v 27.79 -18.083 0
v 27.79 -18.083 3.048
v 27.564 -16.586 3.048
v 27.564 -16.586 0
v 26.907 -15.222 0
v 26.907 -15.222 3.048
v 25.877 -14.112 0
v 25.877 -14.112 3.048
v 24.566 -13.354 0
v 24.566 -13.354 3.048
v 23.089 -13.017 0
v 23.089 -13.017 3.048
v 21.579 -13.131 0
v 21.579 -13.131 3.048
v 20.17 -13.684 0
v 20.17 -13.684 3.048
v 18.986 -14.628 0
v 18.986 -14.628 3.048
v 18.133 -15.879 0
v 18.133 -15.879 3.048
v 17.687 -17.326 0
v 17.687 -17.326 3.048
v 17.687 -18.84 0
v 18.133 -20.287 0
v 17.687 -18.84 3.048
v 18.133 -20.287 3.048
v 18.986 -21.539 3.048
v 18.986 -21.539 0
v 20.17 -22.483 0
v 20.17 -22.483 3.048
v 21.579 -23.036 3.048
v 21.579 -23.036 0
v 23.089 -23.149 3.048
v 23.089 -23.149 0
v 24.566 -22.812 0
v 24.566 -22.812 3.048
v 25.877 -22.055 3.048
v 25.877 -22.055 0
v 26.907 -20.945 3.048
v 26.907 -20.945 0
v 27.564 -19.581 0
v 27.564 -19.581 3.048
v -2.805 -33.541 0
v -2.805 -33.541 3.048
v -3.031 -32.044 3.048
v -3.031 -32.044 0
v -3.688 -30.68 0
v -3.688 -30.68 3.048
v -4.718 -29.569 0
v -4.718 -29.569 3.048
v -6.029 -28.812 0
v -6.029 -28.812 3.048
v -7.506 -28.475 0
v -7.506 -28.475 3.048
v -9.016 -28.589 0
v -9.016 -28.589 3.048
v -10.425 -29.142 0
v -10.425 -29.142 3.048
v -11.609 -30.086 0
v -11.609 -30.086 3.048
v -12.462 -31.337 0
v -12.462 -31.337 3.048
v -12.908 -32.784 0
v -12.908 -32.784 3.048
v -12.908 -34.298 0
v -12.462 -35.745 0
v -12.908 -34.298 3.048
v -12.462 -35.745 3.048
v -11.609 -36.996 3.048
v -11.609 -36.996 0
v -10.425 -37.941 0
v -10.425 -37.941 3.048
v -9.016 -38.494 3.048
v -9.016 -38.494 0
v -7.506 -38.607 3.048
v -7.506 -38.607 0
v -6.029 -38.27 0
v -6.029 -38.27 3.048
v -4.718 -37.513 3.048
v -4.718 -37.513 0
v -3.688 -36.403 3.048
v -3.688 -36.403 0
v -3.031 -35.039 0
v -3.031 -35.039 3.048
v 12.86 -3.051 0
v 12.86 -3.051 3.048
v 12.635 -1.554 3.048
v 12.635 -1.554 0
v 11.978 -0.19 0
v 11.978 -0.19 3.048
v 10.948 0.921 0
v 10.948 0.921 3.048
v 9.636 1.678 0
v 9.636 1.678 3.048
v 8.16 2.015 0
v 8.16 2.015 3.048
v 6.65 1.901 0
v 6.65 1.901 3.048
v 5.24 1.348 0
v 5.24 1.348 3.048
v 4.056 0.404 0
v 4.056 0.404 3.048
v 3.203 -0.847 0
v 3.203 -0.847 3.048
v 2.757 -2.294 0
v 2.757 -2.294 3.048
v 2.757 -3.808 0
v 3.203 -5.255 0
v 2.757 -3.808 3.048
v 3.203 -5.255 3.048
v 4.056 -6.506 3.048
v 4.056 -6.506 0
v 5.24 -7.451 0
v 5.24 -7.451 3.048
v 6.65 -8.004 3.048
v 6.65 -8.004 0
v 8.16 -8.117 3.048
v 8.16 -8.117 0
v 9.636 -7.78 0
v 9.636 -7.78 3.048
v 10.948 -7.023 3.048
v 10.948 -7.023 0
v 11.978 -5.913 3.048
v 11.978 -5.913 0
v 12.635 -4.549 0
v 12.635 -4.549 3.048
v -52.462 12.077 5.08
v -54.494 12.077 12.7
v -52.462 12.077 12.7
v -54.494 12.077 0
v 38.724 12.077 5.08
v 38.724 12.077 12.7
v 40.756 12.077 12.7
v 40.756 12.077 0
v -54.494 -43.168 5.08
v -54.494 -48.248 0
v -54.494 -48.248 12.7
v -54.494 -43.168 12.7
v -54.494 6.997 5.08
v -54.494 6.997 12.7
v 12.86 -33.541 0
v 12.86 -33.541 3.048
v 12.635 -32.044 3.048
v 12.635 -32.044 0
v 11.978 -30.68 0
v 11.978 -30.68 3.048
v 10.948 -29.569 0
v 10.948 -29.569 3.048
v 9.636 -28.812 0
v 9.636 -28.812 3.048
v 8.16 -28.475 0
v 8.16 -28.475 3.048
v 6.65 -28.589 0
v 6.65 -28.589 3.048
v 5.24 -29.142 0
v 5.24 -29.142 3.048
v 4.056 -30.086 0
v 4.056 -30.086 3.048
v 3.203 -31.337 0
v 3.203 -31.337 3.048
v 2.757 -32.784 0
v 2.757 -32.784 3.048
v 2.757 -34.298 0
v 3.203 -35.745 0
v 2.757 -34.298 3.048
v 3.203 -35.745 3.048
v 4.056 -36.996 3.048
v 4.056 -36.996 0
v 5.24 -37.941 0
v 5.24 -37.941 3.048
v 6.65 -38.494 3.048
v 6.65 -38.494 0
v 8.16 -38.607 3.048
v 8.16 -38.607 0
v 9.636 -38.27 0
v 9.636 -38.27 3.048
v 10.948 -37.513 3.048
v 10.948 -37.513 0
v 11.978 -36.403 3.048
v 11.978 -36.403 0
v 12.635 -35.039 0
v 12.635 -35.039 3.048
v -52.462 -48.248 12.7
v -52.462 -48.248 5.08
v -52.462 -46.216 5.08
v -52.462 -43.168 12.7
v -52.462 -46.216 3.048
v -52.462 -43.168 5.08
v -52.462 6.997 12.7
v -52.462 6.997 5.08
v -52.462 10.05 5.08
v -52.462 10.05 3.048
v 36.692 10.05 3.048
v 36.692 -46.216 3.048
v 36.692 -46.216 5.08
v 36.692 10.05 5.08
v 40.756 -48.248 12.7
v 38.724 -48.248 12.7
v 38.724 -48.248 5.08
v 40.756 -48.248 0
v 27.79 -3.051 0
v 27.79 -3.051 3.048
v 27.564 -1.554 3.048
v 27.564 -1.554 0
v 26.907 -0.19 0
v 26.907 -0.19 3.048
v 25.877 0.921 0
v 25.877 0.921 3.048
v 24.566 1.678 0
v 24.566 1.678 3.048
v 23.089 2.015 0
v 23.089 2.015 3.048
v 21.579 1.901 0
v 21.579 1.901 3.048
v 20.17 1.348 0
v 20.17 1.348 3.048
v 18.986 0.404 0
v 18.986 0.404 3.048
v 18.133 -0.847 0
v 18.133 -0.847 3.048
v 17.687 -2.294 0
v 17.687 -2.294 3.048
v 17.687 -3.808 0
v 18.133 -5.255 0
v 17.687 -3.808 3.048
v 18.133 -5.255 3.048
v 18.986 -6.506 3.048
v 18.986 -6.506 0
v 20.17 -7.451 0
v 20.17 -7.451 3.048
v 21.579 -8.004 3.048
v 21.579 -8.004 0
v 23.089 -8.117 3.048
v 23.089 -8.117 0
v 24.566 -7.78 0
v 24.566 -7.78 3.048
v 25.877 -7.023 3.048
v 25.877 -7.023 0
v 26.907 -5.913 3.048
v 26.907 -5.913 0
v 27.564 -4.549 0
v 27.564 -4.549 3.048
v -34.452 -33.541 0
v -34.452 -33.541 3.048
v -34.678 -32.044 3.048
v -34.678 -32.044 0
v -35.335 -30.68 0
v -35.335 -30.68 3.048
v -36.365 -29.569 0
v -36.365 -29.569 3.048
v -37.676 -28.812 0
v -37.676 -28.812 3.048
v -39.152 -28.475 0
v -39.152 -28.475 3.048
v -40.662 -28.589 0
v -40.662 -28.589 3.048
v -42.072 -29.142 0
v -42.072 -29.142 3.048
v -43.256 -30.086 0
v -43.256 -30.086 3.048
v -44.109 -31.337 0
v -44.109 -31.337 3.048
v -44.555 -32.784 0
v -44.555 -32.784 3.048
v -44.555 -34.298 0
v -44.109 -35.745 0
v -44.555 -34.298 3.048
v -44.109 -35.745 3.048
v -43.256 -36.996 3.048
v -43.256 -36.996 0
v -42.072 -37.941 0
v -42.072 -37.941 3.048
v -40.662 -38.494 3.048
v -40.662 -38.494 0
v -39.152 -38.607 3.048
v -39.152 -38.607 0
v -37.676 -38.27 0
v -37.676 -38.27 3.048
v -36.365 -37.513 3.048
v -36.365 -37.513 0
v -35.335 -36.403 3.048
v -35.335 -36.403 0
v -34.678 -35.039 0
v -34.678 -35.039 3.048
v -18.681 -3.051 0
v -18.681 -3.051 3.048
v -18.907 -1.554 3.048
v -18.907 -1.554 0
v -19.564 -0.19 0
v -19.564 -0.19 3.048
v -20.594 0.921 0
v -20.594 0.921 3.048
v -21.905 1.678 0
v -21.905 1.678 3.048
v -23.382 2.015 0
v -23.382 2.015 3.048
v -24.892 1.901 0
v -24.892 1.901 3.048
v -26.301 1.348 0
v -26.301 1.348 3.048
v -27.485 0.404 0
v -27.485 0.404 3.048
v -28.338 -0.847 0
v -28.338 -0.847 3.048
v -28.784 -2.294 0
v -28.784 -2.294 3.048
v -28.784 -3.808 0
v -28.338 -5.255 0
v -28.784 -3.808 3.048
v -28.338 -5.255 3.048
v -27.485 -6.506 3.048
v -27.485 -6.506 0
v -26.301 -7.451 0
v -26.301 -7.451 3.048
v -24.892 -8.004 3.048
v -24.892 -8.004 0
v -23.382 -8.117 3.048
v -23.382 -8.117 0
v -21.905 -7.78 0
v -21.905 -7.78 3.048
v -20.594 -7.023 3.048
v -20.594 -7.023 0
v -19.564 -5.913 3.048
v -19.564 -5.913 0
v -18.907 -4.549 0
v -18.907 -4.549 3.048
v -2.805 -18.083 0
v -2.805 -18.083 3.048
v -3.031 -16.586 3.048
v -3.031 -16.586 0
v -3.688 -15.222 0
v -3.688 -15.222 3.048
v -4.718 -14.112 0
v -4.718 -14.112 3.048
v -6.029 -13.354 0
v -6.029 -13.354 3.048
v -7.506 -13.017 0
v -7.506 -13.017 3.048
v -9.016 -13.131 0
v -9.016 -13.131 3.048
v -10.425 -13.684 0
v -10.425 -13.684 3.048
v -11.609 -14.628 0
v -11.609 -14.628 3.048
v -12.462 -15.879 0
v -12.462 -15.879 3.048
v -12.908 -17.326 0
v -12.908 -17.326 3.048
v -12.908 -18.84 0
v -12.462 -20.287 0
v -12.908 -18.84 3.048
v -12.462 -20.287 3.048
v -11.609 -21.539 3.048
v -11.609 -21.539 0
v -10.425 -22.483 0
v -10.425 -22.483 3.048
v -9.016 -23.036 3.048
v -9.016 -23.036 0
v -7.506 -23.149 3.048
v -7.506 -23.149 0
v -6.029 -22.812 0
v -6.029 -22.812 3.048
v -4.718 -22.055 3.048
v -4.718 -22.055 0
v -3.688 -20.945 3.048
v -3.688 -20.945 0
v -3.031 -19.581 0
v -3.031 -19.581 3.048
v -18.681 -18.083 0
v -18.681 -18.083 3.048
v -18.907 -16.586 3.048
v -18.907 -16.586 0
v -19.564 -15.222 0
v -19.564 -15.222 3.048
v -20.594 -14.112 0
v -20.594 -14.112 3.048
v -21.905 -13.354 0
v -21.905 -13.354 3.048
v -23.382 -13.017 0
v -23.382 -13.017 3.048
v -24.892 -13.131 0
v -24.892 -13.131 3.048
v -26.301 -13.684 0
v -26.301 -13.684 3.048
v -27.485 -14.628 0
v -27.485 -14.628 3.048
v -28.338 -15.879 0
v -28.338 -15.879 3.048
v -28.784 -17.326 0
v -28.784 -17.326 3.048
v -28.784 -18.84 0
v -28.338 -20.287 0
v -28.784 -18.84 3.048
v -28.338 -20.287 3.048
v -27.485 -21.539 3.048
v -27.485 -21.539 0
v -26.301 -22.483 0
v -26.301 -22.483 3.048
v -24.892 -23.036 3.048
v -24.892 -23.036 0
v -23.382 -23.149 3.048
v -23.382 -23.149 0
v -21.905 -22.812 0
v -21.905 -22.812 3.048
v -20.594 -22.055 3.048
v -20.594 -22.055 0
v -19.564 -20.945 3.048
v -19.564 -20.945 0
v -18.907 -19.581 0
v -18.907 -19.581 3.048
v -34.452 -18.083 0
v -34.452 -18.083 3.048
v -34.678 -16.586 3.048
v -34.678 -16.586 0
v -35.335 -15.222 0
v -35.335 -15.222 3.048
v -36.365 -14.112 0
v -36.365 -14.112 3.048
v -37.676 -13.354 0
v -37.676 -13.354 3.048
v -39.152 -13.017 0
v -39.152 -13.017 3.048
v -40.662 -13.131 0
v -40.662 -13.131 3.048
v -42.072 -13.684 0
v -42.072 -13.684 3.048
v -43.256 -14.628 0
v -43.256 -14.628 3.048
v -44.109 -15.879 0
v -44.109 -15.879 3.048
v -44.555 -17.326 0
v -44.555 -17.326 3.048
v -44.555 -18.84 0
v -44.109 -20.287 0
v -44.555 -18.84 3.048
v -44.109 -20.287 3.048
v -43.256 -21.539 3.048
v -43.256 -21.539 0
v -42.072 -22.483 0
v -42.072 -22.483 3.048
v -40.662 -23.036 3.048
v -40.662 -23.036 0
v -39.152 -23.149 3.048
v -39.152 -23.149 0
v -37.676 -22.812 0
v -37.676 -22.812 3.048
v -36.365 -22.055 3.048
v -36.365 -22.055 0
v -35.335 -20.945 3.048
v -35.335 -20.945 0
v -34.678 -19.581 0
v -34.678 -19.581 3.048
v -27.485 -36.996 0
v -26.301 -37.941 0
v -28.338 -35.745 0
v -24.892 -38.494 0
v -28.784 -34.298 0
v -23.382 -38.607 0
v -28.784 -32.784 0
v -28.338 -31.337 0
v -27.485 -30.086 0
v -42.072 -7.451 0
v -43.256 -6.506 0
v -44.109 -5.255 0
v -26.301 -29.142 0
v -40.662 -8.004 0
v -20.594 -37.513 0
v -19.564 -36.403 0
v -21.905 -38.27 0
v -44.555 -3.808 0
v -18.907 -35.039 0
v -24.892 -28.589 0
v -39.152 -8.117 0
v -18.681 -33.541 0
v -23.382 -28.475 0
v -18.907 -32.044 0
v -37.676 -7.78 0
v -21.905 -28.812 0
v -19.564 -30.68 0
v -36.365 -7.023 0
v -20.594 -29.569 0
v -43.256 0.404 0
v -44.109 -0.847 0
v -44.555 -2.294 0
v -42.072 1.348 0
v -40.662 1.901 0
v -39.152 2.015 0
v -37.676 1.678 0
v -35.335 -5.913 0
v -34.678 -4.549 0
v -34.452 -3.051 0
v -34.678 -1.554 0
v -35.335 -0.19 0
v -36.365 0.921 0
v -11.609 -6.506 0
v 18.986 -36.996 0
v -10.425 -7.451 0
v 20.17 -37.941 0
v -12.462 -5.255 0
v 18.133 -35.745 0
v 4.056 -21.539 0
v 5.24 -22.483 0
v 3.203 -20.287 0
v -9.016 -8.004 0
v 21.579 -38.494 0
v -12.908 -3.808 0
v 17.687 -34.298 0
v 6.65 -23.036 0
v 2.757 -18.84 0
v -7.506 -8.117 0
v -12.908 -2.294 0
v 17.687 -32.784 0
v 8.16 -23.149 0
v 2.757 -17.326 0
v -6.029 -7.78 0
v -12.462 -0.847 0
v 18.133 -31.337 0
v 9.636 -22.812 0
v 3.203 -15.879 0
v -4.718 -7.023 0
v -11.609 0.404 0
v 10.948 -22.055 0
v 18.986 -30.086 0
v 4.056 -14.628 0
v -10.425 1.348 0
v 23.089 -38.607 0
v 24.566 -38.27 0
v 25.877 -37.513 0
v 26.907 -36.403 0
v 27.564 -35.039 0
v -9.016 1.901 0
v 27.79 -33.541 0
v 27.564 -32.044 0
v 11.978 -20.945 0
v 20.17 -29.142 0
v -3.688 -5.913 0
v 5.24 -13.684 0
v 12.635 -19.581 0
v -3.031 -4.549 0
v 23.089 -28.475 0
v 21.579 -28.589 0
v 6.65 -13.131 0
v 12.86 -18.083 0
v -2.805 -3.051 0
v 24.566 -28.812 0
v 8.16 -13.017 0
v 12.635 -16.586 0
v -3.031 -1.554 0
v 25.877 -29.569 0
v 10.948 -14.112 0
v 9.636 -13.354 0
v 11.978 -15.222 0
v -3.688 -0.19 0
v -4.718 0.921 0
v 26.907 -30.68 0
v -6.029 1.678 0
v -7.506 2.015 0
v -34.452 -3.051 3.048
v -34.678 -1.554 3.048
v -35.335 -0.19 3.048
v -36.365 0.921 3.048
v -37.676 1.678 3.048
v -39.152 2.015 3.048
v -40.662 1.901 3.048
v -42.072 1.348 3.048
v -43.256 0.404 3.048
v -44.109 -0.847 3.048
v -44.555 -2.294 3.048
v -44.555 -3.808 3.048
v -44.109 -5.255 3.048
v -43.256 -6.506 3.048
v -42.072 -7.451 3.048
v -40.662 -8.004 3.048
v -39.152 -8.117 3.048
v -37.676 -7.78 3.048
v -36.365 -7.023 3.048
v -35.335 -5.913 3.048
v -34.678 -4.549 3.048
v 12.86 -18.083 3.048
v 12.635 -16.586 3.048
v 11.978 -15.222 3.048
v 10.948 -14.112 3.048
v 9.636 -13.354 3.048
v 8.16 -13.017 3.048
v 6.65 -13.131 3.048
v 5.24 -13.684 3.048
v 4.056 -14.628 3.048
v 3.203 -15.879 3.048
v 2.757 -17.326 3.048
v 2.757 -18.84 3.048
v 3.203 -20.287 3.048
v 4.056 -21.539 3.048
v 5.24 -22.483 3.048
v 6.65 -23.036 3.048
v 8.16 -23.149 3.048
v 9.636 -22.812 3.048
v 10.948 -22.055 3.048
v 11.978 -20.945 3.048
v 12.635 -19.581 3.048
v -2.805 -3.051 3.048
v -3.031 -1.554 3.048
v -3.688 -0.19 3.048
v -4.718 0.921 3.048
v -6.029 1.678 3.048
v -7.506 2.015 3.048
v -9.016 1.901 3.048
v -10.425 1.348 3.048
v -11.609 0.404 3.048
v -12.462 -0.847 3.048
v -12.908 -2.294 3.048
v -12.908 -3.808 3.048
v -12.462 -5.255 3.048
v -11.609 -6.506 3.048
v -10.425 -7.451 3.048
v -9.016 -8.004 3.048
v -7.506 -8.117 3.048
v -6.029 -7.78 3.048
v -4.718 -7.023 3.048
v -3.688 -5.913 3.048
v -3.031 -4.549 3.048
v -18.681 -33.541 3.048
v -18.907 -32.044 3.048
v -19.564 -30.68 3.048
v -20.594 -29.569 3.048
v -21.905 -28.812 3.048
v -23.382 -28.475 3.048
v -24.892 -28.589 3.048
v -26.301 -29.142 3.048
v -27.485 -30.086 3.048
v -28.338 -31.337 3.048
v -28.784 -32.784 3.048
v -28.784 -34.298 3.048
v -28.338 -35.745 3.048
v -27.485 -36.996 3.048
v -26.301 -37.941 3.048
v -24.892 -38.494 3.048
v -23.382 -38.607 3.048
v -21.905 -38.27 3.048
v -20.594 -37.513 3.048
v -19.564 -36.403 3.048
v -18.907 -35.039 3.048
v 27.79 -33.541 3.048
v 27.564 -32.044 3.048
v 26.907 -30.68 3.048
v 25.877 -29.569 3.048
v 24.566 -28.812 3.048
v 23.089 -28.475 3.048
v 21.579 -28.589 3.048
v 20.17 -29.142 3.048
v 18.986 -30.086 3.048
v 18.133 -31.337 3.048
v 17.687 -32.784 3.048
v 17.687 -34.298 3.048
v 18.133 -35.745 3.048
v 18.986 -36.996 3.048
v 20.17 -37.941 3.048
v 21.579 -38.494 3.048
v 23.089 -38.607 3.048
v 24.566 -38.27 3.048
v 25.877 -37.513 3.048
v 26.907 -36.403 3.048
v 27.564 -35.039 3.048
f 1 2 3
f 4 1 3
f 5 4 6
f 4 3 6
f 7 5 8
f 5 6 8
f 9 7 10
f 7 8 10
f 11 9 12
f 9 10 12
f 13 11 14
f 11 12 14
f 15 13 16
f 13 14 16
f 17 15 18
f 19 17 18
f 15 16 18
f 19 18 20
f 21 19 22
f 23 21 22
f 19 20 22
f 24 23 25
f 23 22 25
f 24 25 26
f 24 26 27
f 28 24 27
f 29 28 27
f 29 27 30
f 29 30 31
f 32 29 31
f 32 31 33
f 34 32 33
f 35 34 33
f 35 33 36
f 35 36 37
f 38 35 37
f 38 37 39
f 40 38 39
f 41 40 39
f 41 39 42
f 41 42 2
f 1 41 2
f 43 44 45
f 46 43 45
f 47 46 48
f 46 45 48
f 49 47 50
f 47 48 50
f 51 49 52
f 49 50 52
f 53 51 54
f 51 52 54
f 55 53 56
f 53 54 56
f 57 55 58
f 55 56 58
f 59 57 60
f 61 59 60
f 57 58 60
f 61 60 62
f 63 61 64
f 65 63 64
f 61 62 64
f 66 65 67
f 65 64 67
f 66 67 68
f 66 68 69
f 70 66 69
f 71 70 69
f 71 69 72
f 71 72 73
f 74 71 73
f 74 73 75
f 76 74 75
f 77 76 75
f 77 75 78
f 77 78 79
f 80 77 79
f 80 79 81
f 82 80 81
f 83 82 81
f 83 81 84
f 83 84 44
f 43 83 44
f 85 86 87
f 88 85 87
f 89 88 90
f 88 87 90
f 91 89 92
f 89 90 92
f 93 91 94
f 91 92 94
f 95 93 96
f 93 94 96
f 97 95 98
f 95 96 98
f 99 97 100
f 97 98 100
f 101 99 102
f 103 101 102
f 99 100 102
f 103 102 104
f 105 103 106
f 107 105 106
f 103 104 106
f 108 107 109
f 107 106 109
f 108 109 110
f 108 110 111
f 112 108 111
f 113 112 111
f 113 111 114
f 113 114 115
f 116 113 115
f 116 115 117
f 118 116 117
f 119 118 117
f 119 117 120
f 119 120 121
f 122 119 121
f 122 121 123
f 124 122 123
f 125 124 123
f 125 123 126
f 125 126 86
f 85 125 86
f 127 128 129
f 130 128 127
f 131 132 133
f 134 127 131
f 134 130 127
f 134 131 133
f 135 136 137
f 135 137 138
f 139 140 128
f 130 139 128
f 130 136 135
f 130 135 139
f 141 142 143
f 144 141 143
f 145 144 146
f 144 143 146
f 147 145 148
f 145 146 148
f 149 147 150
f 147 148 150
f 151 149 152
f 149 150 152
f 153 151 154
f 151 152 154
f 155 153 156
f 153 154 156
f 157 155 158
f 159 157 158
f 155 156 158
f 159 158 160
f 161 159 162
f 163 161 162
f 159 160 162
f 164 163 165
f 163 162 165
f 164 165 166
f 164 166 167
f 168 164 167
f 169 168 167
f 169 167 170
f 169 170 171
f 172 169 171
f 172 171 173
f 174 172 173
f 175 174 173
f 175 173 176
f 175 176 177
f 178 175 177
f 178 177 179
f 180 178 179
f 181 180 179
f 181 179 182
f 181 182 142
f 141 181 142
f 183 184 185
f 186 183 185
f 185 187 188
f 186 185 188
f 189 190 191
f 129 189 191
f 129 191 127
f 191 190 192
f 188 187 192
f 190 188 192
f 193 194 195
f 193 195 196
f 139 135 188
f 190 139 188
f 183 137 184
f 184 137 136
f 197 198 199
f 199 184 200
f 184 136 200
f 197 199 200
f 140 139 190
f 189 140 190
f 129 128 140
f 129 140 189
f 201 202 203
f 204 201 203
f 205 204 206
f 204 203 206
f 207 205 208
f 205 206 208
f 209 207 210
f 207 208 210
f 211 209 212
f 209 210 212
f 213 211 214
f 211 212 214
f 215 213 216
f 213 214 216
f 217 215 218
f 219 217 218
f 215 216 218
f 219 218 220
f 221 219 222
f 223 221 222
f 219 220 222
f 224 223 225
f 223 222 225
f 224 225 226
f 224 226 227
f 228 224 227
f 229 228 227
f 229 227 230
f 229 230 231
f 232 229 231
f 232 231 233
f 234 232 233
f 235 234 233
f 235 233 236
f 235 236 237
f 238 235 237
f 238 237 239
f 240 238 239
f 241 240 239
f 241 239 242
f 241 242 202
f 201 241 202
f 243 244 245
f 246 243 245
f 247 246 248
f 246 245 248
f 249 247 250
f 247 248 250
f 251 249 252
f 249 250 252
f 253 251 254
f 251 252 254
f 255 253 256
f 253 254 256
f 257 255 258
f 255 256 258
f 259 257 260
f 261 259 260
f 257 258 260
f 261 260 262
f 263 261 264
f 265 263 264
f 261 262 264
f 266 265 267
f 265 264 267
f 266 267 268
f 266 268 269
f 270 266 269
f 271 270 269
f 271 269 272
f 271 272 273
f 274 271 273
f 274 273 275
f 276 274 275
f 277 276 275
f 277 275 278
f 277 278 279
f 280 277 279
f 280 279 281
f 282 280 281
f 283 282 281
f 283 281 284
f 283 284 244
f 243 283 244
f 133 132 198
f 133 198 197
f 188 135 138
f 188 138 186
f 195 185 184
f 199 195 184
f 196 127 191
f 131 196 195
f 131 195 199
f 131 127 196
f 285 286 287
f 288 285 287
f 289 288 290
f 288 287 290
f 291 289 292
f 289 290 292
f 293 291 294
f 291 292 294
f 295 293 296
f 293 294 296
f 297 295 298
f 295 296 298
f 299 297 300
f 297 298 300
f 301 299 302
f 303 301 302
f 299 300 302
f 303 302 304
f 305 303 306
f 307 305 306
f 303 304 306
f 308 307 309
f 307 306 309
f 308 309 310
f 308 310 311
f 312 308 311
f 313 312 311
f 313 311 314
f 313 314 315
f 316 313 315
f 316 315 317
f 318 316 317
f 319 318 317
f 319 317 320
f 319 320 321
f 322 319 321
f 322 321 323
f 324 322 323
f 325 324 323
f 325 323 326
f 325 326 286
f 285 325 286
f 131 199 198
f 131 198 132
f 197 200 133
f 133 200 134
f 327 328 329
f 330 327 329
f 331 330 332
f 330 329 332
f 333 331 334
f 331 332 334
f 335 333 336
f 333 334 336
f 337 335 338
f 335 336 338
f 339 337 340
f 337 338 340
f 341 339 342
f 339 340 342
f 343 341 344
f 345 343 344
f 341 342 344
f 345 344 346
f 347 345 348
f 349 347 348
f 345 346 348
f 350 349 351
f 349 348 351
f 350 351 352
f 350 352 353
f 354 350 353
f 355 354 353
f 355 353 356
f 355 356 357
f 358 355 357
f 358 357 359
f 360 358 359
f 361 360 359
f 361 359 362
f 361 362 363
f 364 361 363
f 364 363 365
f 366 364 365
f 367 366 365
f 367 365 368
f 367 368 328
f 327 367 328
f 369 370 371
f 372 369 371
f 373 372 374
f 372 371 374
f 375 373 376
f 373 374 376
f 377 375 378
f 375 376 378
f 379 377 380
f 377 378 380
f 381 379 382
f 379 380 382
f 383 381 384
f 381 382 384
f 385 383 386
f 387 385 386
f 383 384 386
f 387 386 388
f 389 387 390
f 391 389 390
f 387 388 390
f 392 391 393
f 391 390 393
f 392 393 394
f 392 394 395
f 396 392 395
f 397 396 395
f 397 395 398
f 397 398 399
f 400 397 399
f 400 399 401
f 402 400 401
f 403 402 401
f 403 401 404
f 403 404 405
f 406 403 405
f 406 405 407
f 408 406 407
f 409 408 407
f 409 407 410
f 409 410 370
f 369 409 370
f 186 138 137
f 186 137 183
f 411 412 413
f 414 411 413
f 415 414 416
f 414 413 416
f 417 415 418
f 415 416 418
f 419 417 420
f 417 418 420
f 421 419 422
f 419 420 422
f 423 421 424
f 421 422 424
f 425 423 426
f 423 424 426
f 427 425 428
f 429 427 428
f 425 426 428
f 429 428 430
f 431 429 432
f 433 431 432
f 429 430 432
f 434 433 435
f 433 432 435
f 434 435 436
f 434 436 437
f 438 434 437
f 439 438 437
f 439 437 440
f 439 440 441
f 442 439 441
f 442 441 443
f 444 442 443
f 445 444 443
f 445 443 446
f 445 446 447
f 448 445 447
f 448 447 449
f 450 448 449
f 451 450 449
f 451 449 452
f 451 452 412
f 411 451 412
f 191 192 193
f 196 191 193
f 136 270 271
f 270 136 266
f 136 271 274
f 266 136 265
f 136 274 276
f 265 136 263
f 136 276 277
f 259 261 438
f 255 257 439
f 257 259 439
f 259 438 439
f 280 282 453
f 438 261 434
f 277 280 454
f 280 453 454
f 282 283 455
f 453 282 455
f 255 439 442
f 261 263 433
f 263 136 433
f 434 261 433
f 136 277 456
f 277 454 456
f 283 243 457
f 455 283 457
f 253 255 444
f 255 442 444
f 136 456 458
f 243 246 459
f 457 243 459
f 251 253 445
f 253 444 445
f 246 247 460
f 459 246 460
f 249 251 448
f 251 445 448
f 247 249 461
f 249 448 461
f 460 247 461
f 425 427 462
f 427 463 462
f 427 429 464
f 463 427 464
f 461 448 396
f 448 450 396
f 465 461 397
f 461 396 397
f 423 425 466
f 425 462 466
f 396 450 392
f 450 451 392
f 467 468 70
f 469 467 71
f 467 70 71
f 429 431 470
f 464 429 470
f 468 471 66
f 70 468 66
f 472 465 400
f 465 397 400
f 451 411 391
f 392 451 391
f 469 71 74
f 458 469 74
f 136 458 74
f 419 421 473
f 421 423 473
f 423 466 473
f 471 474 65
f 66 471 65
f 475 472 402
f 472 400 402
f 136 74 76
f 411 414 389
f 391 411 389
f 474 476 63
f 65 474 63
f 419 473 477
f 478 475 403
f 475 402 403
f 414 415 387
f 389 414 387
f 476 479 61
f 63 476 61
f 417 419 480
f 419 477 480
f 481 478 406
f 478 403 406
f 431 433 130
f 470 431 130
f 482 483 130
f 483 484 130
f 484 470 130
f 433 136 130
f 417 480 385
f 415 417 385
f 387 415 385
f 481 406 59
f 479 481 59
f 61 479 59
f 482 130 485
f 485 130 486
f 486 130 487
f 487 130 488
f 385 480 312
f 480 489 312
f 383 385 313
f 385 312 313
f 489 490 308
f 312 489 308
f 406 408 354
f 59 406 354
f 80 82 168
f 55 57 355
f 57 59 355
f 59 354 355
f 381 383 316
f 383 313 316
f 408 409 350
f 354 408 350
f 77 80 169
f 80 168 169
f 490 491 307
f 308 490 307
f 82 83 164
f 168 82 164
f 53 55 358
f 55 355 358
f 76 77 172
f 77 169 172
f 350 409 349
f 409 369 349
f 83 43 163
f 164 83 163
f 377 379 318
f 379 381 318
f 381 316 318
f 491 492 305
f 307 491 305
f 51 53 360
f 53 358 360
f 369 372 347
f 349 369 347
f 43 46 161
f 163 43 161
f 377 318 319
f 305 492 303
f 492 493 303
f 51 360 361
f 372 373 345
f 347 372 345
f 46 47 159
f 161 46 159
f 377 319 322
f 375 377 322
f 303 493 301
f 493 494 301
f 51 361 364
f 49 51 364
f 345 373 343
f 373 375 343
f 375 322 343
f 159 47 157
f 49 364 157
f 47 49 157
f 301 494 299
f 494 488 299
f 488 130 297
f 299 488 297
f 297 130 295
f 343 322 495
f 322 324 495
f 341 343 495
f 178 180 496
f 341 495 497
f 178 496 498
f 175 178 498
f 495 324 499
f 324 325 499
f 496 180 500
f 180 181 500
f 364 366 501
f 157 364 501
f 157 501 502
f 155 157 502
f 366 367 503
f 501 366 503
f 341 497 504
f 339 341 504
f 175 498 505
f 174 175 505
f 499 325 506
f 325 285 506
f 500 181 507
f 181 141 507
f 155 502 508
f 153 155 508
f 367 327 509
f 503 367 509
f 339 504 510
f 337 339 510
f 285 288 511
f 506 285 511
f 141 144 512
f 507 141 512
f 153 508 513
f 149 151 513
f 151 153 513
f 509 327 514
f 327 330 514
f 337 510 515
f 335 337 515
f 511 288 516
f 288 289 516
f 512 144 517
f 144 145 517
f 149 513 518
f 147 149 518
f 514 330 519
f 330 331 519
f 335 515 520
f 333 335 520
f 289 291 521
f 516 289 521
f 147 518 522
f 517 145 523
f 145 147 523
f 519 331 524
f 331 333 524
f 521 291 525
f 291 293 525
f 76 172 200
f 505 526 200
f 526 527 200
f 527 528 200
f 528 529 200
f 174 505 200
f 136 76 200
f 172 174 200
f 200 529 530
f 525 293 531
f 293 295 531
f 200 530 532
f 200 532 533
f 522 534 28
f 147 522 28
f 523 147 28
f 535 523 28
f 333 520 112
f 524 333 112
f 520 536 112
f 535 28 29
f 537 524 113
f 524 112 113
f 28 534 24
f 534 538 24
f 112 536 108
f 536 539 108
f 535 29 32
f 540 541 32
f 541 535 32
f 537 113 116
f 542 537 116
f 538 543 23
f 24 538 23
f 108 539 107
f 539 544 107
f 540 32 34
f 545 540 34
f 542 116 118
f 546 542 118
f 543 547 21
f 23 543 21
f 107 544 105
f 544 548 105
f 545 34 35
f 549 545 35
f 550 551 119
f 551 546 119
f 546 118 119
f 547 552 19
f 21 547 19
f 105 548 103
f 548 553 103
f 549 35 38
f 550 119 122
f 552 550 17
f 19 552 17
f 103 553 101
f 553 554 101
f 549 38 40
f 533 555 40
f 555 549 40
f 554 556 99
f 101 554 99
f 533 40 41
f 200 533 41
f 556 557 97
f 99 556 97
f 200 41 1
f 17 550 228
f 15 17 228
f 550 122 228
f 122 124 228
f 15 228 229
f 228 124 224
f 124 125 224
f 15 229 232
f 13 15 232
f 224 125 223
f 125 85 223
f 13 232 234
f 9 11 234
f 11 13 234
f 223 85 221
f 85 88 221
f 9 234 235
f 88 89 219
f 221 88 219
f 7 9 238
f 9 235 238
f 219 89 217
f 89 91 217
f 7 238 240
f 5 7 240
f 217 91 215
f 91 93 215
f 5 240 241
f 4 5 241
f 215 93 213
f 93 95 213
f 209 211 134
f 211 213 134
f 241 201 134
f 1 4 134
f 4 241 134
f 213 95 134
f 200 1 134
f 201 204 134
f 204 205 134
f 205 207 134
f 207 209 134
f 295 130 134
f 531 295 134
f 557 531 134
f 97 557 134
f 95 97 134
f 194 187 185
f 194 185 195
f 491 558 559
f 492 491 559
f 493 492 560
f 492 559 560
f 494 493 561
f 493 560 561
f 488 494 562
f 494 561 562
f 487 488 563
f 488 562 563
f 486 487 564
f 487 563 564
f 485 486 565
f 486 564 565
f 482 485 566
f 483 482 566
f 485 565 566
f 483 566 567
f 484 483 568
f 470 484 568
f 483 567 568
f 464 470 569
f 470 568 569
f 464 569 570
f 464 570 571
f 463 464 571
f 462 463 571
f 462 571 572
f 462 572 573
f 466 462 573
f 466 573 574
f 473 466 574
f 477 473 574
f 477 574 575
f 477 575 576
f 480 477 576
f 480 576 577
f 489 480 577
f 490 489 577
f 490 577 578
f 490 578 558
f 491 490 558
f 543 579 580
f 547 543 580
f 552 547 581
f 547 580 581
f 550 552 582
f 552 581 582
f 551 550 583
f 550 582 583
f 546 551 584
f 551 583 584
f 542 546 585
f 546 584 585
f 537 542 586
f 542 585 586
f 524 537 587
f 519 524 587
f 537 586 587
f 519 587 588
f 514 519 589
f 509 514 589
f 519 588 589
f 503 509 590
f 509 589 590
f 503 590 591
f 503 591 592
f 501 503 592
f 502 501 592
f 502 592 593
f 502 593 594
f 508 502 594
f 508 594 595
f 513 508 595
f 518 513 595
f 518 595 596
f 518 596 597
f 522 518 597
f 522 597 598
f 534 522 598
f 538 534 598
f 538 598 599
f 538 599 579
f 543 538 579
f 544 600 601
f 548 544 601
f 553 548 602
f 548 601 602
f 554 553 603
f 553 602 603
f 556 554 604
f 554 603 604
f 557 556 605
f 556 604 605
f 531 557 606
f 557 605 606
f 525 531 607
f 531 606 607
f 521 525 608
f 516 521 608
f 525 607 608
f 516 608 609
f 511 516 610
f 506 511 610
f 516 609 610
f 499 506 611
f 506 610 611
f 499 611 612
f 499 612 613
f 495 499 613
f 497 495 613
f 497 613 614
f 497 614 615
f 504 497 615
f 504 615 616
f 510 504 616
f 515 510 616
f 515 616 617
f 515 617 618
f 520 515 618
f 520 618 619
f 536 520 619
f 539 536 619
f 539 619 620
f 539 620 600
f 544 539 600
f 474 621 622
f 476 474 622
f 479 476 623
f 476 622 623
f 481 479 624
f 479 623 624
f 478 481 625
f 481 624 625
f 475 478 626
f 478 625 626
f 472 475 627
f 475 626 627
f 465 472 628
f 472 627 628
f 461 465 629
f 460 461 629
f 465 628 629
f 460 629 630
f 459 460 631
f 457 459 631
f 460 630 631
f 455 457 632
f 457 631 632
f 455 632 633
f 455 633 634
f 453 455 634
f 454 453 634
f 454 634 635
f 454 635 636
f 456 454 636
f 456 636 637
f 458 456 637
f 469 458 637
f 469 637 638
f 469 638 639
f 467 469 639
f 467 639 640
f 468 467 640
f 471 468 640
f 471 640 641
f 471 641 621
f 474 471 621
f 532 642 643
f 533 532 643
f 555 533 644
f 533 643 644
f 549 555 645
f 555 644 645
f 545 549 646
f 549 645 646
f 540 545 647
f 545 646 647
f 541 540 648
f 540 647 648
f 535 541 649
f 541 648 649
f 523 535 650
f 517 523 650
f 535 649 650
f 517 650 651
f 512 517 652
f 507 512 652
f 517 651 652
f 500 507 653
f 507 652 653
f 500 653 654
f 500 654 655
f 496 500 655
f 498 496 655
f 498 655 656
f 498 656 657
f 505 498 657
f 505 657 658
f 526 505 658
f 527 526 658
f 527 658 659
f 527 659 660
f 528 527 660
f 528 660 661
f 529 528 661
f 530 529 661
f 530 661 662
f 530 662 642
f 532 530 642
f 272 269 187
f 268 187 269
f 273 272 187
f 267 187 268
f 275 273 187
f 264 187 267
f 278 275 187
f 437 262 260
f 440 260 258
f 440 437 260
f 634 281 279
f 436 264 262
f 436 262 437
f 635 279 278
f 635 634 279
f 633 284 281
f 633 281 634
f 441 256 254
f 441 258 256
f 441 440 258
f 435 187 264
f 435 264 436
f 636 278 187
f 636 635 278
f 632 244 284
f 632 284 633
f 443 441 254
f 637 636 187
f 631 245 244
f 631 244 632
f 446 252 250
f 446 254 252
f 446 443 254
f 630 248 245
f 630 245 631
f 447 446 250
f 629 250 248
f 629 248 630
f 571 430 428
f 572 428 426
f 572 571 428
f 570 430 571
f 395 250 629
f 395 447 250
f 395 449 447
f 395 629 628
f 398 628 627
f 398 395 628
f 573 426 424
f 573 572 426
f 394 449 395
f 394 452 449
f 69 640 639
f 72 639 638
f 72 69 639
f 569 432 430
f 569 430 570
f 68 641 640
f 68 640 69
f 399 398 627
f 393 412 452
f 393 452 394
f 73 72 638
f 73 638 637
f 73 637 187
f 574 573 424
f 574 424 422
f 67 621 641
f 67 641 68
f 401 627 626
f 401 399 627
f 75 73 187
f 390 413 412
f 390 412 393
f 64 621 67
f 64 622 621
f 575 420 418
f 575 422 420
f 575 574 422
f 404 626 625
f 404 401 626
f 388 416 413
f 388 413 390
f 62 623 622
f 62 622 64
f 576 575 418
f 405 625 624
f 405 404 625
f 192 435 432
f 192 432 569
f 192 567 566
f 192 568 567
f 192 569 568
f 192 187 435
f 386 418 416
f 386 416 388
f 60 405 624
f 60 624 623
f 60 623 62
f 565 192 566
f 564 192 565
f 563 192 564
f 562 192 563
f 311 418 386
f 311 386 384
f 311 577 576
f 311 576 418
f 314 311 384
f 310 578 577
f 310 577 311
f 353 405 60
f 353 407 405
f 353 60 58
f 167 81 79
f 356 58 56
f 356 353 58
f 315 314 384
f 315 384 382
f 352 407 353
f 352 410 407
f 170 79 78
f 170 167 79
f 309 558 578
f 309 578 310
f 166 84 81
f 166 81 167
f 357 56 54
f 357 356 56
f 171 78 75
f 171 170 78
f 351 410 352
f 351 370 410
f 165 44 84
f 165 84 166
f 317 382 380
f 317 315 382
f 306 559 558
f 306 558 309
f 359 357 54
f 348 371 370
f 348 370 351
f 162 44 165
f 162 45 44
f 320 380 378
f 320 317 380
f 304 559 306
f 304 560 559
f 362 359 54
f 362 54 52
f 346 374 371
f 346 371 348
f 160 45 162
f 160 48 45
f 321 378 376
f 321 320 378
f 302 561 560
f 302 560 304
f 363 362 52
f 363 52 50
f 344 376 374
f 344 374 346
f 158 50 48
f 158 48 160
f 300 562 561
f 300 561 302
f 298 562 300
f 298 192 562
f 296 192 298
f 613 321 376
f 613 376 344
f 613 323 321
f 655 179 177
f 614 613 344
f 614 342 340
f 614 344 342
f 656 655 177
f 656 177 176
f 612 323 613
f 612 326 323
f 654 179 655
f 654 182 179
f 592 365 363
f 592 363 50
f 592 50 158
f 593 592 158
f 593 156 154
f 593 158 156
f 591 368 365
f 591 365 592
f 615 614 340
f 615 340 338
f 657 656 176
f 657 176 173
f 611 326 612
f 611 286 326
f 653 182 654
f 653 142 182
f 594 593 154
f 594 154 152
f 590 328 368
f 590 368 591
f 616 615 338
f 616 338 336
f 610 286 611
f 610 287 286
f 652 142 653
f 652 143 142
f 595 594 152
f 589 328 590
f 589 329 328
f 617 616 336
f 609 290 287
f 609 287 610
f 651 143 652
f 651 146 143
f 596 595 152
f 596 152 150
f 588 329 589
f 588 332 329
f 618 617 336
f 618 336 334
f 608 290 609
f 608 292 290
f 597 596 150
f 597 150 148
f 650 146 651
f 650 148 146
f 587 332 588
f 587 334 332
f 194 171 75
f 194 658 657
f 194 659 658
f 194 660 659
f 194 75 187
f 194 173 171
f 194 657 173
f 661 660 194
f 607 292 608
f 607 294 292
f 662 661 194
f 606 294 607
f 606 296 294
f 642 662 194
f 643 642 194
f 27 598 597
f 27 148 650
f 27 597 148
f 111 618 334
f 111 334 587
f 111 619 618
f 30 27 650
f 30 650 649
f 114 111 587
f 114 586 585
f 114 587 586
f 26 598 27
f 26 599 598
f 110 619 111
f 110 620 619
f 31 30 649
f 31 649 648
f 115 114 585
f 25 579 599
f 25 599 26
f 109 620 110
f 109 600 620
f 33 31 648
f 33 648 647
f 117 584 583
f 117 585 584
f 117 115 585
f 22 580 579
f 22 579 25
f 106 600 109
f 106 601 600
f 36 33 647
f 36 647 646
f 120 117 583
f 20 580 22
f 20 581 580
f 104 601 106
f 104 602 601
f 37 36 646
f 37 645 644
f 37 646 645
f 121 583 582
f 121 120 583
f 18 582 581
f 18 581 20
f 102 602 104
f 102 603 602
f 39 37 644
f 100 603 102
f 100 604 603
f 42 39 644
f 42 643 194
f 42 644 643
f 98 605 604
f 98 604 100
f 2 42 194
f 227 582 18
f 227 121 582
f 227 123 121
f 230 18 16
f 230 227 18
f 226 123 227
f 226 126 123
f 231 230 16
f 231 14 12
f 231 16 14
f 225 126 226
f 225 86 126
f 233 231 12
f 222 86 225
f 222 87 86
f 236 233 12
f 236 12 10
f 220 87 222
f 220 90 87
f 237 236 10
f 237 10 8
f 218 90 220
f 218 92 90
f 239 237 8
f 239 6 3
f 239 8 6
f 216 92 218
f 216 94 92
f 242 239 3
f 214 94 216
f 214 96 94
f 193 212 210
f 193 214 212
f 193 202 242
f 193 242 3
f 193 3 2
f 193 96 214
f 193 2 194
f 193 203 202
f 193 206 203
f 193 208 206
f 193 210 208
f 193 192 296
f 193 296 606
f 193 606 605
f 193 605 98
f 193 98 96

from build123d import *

# Parameters (mm, degrees)
F0_W      = 95.25
F0_H      = 60.325
F1_DEPTH  = 3.048
F2_W      = 2.032
F2_H      = 60.325
F3_DEPTH  = 9.652
F4_W      = 2.032
F4_H      = 5.08
F5_DEPTH  = 9.652
F6_W      = 2.032
F6_H      = 5.08
F7_DEPTH  = 9.652
F8_W      = 91.186
F8_H      = 2.027074
F8_H_2    = 2.032
F9_DEPTH  = 2.032
F10_W     = 2.032
F10_H     = 50.165
F11_DEPTH = 2.032
F12_W     = 2.032
F12_H     = 56.265926
F13_DEPTH = 2.032
F14_R     = 5.08
F15_DEPTH = 25.4


with BuildPart() as f1:
    # F0 (on Top) → F1 (new body)
    with BuildSketch(Plane.XY):
        with Locations((-6.869216, -18.085686)):
            Rectangle(F0_W, F0_H)
    extrude(amount=F1_DEPTH)

    # F2 (on face) → F3 (join)
    with BuildSketch(Plane.XY.offset(3.048)):
        with Locations((39.739784, -18.085686)):
            Rectangle(F2_W, F2_H)
    extrude(amount=F3_DEPTH)

    # F4 (on face) → F5 (join)
    with BuildSketch(Plane.XY.offset(3.048)):
        with Locations((-53.478216, -45.708186)):
            Rectangle(F4_W, F4_H)
    extrude(amount=F5_DEPTH)

    # F6 (on face) → F7 (join)
    with BuildSketch(Plane.XY.offset(3.048)):
        with Locations((-53.478216, 9.536814)):
            Rectangle(F6_W, F6_H)
    extrude(amount=F7_DEPTH)

    # F8 (on face) → F9 (join)
    with BuildSketch(Plane.XY.offset(3.048)):
        with Locations((-6.869216, 11.063277)):
            Rectangle(F8_W, F8_H)
        with Locations((-6.869216, -47.232186)):
            Rectangle(F8_W, F8_H_2)
    extrude(amount=F9_DEPTH)

    # F10 (on face) → F11 (join)
    with BuildSketch(Plane.XY.offset(3.048)):
        with Locations((-53.478216, -18.085686)):
            Rectangle(F10_W, F10_H)
    extrude(amount=F11_DEPTH)

    # F12 (on face) → F13 (join)
    with BuildSketch(Plane.XY.offset(3.048)):
        with Locations((37.707784, -18.083223)):
            Rectangle(F12_W, F12_H)
    extrude(amount=F13_DEPTH)

    # F14 (on face) → F15 (cut)
    with BuildSketch(Plane.XY.offset(3.048)):
        with Locations((-39.531879, -3.051191)):
            Circle(F14_R)
        with Locations((-23.761189, -3.051191)):
            Circle(F14_R)
        with Locations((-7.885216, -3.051191)):
            Circle(F14_R)
        with Locations((7.780211, -3.051191)):
            Circle(F14_R)
        with Locations((22.709807, -3.051191)):
            Circle(F14_R)
        with Locations((22.709807, -18.083223)):
            Circle(F14_R)
        with Locations((7.780211, -18.083223)):
            Circle(F14_R)
        with Locations((-7.885216, -18.083223)):
            Circle(F14_R)
        with Locations((-23.761189, -18.083223)):
            Circle(F14_R)
        with Locations((-39.531879, -18.083223)):
            Circle(F14_R)
        with Locations((-39.531879, -33.541203)):
            Circle(F14_R)
        with Locations((-23.761189, -33.541203)):
            Circle(F14_R)
        with Locations((-7.885216, -33.541203)):
            Circle(F14_R)
        with Locations((22.709807, -33.541203)):
            Circle(F14_R)
        with Locations((7.780211, -33.541203)):
            Circle(F14_R)
    extrude(amount=-F15_DEPTH, mode=Mode.SUBTRACT)


solid = f1.part
